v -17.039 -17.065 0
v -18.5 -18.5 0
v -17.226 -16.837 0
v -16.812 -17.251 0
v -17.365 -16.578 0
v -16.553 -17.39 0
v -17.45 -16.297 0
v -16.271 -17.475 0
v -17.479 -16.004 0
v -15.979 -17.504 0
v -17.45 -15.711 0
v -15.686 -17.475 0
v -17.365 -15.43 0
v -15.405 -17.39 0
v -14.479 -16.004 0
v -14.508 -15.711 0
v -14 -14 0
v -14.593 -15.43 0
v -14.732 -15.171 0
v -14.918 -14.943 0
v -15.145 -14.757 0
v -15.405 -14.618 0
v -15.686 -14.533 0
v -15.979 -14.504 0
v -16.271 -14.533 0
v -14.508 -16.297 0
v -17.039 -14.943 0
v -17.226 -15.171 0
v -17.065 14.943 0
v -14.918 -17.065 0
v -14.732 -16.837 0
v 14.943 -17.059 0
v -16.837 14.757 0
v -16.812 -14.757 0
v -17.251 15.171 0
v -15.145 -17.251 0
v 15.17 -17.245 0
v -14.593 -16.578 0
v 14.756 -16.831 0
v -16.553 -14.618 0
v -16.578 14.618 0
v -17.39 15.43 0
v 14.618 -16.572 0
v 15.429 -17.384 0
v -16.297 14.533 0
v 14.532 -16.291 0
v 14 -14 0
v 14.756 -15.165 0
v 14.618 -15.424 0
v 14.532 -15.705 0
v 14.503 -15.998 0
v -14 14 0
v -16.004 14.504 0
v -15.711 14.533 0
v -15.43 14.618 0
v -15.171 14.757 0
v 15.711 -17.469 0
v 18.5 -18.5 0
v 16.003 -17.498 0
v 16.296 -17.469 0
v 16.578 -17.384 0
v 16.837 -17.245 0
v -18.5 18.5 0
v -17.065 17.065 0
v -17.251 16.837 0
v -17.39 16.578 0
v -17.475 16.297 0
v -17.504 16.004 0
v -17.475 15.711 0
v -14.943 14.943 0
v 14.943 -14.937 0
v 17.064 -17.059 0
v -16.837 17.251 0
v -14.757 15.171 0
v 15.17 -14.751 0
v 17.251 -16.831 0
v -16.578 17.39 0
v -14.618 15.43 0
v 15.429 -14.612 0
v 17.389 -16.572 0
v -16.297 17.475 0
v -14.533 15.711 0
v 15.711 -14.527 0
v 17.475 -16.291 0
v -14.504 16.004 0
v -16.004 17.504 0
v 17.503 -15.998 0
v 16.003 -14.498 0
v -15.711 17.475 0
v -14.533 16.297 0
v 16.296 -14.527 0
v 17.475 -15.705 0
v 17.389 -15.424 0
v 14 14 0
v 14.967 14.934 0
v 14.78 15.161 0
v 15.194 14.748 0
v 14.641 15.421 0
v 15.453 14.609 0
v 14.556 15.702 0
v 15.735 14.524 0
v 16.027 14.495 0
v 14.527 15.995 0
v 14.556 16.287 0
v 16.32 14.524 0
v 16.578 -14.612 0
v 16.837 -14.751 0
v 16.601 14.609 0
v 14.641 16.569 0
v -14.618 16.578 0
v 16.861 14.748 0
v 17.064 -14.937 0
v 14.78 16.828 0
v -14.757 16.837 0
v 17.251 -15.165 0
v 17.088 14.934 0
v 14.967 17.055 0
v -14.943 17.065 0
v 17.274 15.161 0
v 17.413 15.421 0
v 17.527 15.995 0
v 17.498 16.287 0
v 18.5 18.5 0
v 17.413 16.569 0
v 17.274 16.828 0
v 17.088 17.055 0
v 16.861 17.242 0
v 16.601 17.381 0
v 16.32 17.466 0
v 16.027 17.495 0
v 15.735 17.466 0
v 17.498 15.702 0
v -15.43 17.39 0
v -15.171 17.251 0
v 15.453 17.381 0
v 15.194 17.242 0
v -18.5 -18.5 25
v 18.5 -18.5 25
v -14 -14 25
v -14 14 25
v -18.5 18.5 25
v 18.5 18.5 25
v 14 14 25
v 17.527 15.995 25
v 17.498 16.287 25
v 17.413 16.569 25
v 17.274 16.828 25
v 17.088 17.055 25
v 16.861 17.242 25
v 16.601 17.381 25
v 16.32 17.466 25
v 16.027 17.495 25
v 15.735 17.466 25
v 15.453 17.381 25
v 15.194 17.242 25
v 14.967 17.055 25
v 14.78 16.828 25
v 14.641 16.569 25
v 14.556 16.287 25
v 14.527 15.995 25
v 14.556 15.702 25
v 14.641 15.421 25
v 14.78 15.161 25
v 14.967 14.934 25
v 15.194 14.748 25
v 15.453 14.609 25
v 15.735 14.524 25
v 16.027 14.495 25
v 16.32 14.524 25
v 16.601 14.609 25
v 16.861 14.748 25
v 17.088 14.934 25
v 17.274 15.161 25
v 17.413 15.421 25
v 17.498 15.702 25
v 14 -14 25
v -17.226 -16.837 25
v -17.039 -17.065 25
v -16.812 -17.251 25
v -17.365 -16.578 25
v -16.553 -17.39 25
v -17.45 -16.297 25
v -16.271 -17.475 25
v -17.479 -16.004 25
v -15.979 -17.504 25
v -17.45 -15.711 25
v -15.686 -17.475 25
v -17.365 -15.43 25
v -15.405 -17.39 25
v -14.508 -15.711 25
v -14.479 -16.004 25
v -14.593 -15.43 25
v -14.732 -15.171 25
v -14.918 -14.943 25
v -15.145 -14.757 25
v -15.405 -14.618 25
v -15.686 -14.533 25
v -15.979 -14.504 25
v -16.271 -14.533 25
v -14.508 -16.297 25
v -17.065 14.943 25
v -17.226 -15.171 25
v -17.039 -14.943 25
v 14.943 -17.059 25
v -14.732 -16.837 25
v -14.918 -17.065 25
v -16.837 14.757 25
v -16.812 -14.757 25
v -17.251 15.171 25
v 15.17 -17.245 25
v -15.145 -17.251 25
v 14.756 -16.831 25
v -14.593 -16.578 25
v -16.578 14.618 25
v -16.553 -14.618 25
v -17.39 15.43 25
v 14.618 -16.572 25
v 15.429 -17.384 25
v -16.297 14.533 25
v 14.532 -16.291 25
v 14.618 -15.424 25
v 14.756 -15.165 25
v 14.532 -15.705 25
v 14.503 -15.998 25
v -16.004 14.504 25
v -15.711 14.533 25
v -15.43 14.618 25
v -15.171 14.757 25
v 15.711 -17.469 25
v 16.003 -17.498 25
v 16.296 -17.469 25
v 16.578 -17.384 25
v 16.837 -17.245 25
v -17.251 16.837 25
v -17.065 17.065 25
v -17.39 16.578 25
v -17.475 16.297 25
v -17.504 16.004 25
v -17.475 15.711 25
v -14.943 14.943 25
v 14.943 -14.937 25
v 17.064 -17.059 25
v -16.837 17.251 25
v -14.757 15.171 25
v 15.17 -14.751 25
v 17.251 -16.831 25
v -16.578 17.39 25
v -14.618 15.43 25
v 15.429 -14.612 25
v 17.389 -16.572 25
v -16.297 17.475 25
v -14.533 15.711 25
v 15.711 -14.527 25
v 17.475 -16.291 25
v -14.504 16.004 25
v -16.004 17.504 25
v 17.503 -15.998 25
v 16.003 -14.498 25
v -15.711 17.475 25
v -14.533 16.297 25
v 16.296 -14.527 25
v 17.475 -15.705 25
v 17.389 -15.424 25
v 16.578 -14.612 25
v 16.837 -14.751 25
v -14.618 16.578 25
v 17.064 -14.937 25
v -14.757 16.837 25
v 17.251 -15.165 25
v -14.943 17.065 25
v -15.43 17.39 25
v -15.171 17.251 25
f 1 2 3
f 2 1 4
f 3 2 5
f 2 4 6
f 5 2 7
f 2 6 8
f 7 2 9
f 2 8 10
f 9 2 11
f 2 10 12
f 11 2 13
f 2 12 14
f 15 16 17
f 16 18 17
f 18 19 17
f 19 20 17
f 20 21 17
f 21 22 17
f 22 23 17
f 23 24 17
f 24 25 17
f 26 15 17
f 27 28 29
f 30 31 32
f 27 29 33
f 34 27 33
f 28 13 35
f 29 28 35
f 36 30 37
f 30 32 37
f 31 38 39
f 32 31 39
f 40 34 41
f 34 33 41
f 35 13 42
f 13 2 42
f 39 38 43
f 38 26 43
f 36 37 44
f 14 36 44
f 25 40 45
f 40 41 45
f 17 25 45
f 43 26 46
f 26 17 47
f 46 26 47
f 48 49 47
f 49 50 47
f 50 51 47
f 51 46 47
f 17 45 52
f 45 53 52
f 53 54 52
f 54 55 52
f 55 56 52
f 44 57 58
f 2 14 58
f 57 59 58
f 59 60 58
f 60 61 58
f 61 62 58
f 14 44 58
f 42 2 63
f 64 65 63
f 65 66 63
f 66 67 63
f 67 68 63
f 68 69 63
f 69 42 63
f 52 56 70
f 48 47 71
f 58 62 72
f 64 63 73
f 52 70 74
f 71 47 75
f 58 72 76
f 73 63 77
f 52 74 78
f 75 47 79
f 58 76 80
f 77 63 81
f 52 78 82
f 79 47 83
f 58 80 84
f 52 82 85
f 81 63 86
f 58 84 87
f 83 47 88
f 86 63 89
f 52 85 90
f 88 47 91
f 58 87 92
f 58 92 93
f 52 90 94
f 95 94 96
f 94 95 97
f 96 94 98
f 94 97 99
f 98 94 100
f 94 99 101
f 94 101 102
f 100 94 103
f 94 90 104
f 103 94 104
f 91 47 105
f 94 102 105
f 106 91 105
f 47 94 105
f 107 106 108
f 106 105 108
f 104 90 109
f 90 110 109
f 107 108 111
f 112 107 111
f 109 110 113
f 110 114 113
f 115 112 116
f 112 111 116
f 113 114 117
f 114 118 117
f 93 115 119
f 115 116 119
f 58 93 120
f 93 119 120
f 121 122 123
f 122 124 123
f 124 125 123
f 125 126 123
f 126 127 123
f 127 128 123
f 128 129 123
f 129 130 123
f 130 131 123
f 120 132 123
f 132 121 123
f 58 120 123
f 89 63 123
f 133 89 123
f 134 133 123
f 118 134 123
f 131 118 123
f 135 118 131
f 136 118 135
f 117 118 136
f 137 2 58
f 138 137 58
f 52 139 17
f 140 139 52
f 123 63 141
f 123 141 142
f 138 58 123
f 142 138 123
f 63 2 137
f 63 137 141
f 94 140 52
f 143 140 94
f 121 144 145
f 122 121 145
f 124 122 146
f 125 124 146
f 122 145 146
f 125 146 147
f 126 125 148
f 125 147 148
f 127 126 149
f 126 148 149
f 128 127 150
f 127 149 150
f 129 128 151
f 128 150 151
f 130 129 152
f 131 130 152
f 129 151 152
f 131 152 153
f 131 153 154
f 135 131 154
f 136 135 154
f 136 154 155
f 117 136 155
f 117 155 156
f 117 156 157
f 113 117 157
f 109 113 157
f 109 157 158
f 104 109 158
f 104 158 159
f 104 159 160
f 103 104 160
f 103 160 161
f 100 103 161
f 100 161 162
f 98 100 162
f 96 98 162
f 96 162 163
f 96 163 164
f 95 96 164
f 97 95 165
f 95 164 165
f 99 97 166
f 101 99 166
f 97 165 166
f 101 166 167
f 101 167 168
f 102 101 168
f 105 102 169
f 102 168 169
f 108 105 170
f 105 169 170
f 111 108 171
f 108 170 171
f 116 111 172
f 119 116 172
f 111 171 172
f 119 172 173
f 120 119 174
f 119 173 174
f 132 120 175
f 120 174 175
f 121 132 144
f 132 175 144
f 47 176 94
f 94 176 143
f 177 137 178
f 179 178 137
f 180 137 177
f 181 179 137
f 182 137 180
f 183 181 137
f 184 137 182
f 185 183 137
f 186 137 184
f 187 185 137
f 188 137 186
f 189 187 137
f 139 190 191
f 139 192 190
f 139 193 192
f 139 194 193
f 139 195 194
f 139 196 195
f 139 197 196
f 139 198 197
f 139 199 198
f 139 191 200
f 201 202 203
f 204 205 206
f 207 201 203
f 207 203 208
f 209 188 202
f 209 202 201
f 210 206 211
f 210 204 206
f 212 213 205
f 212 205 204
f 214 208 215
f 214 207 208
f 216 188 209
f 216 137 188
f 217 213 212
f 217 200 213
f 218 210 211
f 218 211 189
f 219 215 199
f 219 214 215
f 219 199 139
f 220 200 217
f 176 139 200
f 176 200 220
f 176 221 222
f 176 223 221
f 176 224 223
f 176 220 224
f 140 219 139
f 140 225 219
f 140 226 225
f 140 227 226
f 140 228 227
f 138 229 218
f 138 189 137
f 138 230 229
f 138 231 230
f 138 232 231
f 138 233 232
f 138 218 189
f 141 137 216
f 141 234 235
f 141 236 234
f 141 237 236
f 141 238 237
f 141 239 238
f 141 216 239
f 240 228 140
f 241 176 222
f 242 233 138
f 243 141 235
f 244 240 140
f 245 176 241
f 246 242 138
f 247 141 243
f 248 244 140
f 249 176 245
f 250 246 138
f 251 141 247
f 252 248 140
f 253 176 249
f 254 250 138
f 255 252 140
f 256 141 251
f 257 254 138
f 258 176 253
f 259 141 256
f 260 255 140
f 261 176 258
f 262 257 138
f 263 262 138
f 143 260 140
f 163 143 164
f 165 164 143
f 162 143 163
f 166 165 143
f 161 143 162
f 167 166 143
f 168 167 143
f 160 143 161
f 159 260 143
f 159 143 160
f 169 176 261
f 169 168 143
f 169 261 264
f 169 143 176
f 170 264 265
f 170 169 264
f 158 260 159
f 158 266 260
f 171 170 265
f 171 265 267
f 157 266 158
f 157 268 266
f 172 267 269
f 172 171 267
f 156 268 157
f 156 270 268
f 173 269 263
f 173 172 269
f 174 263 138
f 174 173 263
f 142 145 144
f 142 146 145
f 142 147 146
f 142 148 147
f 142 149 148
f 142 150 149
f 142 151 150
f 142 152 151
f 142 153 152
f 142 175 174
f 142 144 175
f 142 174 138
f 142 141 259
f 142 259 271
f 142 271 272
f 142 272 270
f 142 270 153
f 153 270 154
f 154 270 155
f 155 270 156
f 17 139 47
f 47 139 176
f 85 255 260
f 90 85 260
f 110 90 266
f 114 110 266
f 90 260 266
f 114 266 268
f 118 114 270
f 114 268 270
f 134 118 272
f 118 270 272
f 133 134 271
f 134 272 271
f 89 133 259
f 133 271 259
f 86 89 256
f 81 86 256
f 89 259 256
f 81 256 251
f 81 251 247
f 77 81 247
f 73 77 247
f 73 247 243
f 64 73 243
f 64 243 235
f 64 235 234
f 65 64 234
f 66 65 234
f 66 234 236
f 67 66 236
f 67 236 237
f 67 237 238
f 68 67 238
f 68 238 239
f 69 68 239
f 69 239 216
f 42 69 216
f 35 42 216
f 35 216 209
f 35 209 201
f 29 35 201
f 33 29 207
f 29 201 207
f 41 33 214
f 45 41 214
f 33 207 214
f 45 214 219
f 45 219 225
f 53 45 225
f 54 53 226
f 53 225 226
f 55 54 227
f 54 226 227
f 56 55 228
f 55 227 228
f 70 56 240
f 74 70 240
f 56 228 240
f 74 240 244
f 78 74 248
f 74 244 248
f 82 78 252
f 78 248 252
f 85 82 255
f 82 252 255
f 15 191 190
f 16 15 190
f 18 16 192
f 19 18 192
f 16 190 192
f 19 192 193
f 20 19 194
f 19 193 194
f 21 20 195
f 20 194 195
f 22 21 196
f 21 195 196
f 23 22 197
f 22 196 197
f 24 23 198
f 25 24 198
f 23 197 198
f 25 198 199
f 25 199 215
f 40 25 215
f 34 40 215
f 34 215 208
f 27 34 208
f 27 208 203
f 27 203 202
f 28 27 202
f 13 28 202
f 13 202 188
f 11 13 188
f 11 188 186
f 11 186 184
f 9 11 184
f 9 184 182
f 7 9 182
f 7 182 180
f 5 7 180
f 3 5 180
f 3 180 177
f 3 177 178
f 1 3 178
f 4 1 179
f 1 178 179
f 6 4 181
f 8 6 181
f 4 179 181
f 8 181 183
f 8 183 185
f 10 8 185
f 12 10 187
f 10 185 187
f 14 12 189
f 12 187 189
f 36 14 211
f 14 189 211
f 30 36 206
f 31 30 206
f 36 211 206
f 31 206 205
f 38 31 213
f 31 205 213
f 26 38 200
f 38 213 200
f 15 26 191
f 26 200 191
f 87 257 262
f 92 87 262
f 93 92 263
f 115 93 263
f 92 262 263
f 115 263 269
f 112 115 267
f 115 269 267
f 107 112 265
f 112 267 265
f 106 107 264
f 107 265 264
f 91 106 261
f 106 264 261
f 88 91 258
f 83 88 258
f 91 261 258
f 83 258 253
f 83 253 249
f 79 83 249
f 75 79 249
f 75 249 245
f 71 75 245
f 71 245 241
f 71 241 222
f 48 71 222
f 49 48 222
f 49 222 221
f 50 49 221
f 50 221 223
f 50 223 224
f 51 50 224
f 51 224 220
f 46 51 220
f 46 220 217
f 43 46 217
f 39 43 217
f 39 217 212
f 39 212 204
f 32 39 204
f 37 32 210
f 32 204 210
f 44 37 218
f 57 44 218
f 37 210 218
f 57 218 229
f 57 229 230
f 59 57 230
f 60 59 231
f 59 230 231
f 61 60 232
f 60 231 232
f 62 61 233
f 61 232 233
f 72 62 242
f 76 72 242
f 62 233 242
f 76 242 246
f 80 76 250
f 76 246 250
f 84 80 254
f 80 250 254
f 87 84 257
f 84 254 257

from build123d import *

# Parameters (mm, degrees)
SKETCH1_W           = 37
SKETCH1_H           = 37
BOSS_EXTRUDE1_DEPTH = 25
SKETCH2_W           = 28
SKETCH2_H           = 28
CUT_EXTRUDE1_DEPTH  = 37.187014245
SKETCH6_R           = 1.5
CUT_EXTRUDE3_DEPTH  = 37.187014245


with BuildPart() as part:
    # Sketch1 → Boss-Extrude1 (new body)
    with BuildSketch(Plane.XY):
        Rectangle(SKETCH1_W, SKETCH1_H)
    extrude(amount=BOSS_EXTRUDE1_DEPTH)

    # Sketch2 → Cut-Extrude1 (cut, through all)
    with BuildSketch(Plane.XY.offset(25)):
        Rectangle(SKETCH2_W, SKETCH2_H)
    extrude(amount=-CUT_EXTRUDE1_DEPTH, mode=Mode.SUBTRACT)

    # Sketch6 → Cut-Extrude3 (cut, through all)
    with BuildSketch(Plane.XY.offset(25)):
        with Locations((-16.003913062, 16.003913062)):
            Circle(SKETCH6_R)
        with Locations((16.027281765, 15.994713508)):
            Circle(SKETCH6_R)
        with Locations((16.003485412, -15.997947579)):
            Circle(SKETCH6_R)
        with Locations((-15.978784004, -16.00393382)):
            Circle(SKETCH6_R)
    extrude(amount=-CUT_EXTRUDE3_DEPTH, mode=Mode.SUBTRACT)


solid = part.part
